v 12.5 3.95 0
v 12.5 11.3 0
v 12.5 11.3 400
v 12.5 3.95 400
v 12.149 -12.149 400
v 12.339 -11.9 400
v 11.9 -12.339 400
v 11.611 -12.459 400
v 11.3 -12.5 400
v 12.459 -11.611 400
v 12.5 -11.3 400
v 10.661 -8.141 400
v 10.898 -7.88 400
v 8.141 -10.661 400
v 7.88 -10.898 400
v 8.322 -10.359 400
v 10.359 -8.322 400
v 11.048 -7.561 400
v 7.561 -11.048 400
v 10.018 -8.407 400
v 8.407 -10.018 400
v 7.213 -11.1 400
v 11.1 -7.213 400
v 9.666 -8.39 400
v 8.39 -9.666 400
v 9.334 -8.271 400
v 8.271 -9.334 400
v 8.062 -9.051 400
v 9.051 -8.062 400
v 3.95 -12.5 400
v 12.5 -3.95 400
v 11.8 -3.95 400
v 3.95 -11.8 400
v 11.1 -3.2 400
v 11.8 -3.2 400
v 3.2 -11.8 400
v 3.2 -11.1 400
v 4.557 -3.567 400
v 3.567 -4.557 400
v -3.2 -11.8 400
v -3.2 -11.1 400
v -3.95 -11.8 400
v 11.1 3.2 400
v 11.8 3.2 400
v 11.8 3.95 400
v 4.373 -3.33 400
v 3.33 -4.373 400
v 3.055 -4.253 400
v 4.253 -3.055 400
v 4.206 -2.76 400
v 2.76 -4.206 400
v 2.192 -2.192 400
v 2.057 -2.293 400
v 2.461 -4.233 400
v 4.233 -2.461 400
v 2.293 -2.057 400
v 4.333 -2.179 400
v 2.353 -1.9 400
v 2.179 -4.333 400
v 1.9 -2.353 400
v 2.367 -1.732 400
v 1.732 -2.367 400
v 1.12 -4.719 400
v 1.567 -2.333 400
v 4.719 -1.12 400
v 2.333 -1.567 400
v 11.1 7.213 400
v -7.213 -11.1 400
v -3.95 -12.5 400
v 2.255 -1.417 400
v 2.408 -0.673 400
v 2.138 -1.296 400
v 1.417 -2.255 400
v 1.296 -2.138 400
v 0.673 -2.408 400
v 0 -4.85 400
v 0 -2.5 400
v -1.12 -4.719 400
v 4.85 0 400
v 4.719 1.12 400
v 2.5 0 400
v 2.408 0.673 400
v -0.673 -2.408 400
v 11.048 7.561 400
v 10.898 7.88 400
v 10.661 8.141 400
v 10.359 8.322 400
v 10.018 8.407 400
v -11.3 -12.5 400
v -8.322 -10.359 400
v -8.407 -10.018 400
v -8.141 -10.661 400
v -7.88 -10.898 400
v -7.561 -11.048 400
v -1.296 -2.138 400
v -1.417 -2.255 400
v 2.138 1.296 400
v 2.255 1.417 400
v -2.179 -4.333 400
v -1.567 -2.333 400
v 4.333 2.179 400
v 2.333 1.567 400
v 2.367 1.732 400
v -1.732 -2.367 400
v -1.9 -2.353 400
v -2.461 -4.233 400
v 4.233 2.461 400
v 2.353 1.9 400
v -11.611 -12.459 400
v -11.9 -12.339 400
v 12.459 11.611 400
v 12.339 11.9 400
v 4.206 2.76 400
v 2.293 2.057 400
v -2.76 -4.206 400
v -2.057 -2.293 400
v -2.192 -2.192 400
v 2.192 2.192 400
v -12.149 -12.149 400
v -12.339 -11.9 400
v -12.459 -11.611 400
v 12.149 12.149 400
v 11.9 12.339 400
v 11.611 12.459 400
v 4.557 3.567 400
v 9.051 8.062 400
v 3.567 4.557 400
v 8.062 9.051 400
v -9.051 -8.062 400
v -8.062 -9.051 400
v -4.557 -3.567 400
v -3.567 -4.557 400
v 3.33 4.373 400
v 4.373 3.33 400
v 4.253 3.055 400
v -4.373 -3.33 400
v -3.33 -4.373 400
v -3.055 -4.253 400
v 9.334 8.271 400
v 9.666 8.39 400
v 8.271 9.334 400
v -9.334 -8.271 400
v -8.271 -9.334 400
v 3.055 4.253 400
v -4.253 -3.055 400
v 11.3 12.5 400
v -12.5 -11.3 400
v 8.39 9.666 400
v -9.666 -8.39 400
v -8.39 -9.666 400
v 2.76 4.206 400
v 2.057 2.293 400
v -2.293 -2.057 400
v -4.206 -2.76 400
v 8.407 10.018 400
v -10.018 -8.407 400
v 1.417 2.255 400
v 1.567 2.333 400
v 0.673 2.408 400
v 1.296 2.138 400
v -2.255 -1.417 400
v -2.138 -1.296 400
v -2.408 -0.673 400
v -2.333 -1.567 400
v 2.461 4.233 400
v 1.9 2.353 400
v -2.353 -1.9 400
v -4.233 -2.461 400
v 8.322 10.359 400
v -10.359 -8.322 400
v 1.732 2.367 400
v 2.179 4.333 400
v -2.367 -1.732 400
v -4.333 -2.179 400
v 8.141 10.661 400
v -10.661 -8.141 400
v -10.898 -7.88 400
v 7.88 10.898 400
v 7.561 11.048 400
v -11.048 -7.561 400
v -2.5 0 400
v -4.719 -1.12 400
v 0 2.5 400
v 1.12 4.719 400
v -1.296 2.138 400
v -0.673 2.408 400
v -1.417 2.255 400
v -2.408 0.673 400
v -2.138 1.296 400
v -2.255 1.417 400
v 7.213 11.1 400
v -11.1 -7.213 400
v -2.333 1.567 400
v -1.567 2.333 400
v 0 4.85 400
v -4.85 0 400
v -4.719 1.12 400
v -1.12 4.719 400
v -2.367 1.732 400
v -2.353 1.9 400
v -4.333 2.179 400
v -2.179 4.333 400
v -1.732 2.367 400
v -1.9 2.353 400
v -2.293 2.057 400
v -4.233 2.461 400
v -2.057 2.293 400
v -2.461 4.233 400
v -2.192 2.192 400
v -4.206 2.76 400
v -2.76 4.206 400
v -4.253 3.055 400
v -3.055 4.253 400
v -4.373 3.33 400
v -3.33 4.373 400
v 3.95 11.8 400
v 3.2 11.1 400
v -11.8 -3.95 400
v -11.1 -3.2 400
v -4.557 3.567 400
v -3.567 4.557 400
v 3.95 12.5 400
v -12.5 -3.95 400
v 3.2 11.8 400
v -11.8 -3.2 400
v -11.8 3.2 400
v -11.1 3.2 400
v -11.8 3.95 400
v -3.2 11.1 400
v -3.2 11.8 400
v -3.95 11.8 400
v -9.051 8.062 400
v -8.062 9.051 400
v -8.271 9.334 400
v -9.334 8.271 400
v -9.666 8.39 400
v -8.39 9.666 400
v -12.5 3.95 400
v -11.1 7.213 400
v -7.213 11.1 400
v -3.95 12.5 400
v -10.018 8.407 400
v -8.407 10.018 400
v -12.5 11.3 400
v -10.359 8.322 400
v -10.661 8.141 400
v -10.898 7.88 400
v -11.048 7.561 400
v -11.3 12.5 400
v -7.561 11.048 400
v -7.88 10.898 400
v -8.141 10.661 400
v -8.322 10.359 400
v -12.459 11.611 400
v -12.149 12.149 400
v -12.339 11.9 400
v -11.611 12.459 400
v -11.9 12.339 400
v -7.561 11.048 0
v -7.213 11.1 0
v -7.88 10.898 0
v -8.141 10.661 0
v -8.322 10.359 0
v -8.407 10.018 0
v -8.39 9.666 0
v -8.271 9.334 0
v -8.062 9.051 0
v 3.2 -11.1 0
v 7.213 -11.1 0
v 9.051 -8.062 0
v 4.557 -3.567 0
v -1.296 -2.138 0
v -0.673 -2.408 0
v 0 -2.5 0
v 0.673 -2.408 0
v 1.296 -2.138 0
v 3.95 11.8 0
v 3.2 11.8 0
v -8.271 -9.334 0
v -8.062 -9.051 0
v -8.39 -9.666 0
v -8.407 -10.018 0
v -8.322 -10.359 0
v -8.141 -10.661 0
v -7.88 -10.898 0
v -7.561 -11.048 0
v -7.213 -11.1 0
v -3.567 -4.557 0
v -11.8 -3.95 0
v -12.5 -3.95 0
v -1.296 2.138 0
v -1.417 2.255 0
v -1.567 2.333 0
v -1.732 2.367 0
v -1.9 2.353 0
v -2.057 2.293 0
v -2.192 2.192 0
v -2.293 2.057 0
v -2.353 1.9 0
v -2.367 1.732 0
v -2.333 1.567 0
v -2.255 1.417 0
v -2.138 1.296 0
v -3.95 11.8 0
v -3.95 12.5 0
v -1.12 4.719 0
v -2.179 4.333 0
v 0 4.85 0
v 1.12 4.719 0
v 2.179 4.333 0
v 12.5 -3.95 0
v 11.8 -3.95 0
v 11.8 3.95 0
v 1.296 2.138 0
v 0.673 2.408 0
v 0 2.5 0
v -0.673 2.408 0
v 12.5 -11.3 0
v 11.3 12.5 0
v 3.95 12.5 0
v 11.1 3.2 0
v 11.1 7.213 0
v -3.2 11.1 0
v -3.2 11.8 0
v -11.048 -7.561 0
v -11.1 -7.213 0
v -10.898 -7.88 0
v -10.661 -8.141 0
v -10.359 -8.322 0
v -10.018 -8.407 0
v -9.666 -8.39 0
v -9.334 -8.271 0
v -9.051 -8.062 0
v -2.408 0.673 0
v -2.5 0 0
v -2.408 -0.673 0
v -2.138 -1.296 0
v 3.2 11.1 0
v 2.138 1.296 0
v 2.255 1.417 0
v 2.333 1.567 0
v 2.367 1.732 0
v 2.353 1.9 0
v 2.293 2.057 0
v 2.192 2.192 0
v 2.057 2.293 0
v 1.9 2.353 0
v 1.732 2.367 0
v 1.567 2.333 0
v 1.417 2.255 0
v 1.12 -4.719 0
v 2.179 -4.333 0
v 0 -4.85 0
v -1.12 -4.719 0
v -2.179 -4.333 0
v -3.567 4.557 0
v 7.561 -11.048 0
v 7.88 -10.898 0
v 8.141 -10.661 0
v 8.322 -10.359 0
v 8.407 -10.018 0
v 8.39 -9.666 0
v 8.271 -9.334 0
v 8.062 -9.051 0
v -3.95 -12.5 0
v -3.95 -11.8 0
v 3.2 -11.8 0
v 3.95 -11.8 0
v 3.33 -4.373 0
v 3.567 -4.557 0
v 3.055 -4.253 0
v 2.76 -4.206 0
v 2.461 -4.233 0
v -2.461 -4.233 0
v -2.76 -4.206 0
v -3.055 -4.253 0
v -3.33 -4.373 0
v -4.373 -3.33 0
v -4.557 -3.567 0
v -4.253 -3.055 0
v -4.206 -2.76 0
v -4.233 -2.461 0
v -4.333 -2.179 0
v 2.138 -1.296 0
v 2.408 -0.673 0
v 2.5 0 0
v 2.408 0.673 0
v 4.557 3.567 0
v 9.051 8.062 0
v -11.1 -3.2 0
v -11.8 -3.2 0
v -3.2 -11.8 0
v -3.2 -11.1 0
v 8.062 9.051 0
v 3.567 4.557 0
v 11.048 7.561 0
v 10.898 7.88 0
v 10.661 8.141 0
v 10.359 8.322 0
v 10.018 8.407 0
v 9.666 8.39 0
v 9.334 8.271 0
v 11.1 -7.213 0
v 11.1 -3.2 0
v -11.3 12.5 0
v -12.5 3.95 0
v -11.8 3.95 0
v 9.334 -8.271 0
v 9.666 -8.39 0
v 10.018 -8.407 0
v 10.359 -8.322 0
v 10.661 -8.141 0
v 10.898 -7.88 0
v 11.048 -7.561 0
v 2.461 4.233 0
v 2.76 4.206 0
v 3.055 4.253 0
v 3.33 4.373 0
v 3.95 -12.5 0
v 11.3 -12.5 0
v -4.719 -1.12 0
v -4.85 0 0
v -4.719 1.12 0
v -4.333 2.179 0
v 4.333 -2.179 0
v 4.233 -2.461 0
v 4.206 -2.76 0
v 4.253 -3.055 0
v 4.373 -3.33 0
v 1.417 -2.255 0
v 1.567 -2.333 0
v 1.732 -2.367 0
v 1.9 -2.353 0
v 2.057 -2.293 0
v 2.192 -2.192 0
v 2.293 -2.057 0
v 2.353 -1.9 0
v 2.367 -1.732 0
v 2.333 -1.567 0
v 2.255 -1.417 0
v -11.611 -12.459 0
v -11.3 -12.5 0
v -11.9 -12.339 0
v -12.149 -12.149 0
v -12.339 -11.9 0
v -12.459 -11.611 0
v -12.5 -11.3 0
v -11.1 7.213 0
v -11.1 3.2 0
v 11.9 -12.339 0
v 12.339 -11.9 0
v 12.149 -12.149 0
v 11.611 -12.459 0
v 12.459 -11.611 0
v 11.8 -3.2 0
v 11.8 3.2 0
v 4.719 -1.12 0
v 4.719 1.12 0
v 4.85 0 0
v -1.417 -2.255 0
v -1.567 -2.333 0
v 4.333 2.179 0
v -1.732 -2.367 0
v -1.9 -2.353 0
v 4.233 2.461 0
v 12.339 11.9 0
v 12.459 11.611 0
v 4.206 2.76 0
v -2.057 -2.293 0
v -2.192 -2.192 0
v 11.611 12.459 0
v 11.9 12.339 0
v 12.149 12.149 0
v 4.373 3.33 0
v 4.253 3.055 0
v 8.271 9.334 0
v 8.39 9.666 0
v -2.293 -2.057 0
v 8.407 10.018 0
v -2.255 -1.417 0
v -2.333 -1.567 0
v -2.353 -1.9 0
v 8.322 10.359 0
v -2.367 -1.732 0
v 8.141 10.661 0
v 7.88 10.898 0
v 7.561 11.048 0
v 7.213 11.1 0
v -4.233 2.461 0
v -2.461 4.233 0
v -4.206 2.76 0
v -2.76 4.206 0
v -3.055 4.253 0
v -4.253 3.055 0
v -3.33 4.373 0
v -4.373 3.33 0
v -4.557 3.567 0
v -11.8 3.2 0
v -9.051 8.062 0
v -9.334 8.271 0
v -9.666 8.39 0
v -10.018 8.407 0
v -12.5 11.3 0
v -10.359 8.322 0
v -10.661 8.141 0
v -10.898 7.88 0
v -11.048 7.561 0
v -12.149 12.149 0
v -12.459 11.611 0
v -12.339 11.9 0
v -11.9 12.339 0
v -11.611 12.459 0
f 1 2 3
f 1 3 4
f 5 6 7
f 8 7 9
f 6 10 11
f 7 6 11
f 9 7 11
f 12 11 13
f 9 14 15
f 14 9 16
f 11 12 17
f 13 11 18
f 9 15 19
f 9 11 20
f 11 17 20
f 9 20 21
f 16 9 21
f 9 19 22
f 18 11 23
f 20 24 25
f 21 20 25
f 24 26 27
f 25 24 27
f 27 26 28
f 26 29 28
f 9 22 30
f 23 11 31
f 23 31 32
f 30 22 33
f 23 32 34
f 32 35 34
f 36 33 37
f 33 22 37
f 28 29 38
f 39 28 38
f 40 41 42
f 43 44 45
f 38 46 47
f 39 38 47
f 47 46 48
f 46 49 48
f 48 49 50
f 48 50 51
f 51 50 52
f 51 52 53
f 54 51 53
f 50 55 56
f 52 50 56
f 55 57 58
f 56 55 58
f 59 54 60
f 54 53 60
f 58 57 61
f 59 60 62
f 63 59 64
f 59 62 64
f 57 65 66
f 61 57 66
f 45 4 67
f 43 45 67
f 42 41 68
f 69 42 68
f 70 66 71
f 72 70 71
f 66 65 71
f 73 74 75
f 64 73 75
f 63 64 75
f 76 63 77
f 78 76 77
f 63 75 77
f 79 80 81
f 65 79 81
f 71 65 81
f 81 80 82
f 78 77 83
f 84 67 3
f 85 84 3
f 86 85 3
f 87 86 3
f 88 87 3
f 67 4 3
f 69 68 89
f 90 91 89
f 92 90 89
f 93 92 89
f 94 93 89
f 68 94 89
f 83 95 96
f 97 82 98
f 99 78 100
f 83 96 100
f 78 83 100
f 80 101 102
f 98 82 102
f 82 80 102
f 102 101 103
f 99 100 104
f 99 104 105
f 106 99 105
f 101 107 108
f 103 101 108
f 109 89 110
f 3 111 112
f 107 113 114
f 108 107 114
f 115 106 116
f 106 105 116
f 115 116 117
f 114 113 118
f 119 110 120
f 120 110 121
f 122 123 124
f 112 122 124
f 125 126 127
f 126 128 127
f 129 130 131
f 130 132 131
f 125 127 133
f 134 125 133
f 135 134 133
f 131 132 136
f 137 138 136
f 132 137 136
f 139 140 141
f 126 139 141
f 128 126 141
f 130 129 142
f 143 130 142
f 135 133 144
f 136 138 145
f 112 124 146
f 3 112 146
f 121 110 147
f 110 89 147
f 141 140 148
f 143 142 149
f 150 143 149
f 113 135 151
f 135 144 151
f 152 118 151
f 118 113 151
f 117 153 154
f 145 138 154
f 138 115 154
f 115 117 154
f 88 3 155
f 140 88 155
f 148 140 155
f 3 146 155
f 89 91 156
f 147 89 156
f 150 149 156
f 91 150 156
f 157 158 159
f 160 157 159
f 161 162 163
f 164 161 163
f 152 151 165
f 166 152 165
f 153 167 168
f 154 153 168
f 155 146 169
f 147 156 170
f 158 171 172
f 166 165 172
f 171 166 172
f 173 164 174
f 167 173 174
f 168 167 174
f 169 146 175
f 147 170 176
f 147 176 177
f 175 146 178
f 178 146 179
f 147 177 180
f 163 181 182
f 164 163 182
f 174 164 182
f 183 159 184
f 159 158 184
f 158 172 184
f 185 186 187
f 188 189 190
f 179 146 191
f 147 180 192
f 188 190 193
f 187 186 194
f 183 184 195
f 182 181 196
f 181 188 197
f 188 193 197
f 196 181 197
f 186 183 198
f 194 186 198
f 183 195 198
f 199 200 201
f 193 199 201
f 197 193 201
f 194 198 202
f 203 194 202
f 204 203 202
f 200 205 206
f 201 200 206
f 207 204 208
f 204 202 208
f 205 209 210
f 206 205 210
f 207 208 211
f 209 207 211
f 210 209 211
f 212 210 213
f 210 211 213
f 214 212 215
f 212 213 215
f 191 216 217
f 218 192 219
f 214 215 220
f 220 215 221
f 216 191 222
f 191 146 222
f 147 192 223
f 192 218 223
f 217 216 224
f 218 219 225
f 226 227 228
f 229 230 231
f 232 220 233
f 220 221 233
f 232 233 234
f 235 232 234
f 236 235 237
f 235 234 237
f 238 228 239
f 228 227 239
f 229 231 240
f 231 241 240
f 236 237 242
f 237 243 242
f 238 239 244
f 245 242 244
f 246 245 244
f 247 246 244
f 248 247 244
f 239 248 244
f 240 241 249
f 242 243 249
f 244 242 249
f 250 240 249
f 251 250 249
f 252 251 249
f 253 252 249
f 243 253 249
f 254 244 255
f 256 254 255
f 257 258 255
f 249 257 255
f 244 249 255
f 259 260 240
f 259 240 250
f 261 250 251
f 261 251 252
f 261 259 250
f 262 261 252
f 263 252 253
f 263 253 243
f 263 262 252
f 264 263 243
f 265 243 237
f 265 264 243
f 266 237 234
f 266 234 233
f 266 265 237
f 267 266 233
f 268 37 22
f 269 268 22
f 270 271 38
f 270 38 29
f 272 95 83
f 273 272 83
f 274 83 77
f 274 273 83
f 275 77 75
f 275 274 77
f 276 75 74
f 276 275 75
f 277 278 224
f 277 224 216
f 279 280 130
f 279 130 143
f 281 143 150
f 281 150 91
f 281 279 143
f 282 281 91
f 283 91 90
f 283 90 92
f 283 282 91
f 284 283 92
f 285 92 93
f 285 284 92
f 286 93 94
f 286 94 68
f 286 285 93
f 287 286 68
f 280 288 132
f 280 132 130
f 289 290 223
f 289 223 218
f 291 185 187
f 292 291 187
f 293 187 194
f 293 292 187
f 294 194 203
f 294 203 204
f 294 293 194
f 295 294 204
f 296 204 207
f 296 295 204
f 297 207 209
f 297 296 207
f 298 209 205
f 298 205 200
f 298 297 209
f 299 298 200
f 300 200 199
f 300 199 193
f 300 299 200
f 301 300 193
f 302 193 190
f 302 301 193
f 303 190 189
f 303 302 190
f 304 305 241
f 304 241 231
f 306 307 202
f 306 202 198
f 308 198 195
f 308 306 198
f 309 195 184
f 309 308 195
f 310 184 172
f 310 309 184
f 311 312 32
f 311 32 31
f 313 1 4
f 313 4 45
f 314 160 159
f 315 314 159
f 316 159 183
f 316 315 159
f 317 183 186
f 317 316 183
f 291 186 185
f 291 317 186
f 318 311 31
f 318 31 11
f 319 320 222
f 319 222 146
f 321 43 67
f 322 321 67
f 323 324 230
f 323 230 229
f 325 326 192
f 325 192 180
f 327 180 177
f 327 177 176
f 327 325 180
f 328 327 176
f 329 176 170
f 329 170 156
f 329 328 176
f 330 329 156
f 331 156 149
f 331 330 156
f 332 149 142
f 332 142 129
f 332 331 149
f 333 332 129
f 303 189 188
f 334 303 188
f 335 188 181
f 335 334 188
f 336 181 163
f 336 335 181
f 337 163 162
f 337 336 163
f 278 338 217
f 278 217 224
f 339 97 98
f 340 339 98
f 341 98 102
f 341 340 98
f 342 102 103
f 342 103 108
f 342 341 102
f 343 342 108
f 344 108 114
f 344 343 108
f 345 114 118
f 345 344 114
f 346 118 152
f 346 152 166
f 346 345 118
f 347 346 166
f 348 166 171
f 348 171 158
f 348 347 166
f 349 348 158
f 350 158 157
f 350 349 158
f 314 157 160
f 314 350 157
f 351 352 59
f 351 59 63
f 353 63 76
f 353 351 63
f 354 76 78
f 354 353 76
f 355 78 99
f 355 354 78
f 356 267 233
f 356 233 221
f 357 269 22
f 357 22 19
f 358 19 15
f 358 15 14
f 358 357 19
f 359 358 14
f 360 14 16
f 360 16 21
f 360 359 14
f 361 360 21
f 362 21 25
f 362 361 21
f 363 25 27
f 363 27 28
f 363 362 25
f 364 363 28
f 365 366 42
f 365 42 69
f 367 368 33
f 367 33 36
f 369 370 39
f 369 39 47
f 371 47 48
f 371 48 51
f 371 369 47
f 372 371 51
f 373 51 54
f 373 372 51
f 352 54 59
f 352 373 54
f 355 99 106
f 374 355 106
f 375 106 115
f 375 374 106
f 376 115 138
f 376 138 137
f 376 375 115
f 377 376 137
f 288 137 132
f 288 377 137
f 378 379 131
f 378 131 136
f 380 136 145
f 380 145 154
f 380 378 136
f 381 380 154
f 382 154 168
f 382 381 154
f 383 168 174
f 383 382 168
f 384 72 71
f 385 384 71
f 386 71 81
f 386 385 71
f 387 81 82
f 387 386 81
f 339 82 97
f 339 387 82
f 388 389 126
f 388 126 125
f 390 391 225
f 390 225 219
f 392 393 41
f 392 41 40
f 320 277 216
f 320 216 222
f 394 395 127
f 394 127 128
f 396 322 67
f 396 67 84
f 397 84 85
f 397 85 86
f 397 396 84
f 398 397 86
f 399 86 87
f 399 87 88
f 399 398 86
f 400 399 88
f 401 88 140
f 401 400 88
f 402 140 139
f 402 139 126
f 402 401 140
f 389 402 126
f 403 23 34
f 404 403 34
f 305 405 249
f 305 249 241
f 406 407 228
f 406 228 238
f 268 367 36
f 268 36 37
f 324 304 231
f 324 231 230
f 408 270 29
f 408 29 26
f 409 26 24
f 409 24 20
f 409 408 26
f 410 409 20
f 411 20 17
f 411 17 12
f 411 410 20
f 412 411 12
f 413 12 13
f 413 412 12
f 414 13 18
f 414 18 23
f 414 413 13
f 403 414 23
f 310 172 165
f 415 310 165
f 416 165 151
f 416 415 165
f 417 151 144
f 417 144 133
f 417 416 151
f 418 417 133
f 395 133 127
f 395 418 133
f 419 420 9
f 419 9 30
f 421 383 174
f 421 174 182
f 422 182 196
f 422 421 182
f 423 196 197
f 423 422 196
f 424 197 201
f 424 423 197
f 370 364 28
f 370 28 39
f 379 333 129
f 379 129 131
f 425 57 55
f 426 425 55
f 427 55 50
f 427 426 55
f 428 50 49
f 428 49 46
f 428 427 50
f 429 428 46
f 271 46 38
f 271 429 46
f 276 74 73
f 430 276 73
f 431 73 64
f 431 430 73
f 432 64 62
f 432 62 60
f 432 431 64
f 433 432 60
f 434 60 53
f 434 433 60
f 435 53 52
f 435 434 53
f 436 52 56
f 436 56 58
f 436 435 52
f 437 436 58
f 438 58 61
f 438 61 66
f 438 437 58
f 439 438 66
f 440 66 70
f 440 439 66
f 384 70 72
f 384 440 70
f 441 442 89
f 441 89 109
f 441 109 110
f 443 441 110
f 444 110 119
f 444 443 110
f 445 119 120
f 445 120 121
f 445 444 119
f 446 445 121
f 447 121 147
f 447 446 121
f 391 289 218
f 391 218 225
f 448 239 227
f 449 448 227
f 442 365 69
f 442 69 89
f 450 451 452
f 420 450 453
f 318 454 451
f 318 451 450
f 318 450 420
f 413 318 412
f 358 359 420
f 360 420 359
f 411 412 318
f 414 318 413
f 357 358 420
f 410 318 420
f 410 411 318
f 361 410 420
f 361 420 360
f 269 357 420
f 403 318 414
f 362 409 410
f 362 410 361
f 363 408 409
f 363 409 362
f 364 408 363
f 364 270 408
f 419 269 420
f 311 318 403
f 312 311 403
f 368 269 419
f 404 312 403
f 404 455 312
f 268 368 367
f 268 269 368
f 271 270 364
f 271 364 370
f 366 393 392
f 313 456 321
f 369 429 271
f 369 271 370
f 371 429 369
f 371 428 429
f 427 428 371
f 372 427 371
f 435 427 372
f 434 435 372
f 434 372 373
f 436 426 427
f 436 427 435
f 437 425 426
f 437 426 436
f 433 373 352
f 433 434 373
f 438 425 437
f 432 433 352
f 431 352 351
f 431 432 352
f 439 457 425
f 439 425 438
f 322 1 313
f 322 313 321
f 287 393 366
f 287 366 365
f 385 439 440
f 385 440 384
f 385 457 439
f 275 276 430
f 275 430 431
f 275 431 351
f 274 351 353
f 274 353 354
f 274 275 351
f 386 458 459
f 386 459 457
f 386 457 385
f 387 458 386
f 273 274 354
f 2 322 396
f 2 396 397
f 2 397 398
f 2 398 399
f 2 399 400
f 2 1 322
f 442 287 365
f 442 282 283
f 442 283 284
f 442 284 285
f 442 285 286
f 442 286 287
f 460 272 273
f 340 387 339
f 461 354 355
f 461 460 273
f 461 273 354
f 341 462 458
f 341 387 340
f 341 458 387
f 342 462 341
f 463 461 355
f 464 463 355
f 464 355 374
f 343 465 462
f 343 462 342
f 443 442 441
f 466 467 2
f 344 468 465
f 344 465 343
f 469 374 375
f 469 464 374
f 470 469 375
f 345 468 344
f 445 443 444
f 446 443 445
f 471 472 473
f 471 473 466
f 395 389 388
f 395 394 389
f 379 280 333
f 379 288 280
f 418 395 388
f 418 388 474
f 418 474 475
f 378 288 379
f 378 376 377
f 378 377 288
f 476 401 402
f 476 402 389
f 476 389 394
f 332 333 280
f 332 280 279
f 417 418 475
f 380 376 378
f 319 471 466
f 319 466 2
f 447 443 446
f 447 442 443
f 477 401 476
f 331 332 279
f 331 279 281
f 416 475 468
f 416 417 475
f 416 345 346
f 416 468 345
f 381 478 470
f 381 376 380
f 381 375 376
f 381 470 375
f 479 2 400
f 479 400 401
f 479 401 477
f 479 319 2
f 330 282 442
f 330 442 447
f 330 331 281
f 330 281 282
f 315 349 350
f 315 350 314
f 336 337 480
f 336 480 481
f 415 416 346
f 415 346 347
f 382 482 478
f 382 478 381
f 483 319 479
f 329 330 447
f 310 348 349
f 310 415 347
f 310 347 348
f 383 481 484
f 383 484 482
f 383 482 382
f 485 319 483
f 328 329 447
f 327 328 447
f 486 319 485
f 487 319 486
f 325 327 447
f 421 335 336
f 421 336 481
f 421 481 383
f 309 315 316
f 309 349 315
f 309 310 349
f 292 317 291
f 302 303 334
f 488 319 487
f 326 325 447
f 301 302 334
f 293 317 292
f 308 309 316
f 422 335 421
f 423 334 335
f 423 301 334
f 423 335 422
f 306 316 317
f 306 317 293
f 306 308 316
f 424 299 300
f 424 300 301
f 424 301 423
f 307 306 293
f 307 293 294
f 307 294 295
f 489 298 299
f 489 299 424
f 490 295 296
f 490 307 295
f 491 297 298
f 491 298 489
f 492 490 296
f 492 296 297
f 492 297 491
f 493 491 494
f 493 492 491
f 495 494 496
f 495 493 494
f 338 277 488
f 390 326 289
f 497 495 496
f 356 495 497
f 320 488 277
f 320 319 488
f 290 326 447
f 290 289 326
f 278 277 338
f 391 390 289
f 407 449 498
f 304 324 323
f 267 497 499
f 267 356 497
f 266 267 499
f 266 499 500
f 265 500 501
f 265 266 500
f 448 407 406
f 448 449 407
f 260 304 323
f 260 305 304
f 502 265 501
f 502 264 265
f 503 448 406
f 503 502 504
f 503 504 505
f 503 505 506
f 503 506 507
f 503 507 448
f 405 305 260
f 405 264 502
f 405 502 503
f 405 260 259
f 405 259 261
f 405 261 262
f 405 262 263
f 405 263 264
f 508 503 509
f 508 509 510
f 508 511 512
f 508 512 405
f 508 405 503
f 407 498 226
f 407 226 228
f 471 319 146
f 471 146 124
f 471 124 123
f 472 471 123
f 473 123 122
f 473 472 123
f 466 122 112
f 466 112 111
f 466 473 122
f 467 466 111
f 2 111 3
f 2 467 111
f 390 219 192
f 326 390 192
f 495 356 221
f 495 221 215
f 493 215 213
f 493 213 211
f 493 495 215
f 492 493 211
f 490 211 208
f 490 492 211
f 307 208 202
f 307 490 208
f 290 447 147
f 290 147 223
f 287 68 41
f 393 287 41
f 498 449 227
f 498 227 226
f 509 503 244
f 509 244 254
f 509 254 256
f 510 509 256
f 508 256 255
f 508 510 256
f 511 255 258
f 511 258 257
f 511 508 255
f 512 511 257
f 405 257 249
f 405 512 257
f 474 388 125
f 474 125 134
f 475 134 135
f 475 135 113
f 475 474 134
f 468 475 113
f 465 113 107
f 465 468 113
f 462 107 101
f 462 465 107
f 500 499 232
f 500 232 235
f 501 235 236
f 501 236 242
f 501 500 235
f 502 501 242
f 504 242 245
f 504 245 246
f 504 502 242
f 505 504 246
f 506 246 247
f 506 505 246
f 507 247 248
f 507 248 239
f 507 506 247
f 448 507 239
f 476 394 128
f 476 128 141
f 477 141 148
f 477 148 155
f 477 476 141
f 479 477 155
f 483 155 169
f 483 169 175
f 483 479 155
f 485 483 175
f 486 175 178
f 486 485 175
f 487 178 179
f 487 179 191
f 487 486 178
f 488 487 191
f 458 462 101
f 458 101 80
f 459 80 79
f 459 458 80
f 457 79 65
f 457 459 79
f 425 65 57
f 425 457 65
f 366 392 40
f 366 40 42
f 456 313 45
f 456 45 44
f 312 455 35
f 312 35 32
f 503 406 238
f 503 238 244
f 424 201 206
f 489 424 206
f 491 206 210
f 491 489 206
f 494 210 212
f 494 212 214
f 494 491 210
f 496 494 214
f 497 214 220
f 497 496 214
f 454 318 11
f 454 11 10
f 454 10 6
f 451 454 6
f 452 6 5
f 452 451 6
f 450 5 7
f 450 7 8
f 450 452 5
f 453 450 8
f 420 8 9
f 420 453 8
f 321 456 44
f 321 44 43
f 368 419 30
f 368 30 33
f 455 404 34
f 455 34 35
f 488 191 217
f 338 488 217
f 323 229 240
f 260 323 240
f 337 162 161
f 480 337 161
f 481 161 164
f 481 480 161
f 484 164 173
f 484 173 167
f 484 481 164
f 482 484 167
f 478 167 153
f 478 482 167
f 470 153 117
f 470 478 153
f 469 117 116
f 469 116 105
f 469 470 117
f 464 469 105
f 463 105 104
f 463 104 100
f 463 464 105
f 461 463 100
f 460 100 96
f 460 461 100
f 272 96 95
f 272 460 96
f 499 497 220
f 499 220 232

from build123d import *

# Parameters (mm, degrees)
Y_KSEKLIK_EKSTR_ZYON1_DEPTH = 400


with BuildPart() as part:
    # Çizim1 → Yükseklik-Ekstrüzyon1 (new body)
    with BuildSketch(Plane.XY):
        with BuildLine():
            Line((3.95, 12.5), (11.3, 12.5))
            ThreePointArc((11.3, 12.5), (12.148528137, 12.148528137), (12.5, 11.3))
            Line((12.5, 11.3), (12.5, 3.95))
            Line((12.5, 3.95), (11.8, 3.95))
            Line((11.8, 3.95), (11.8, 3.2))
            Line((11.8, 3.2), (11.1, 3.2))
            Line((11.1, 3.2), (11.1, 7.212994231))
            ThreePointArc((11.1, 7.212994231), (10.359220119, 8.321649671), (9.051471863, 8.061522369))
            Line((9.051471863, 8.061522369), (4.55653233, 3.566582836))
            ThreePointArc((4.55653233, 3.566582836), (4.220335715, 2.90891397), (4.332982358, 2.178936411))
            ThreePointArc((4.332982358, 2.178936411), (4.85, 0), (4.332982358, -2.178936411))
            ThreePointArc((4.332982358, -2.178936411), (4.220335715, -2.90891397), (4.55653233, -3.566582836))
            Line((4.55653233, -3.566582836), (9.051471863, -8.061522369))
            ThreePointArc((9.051471863, -8.061522369), (10.359220119, -8.321649671), (11.1, -7.212994231))
            Line((11.1, -7.212994231), (11.1, -3.2))
            Line((11.1, -3.2), (11.8, -3.2))
            Line((11.8, -3.2), (11.8, -3.95))
            Line((11.8, -3.95), (12.5, -3.95))
            Line((12.5, -3.95), (12.5, -11.3))
            ThreePointArc((12.5, -11.3), (12.148528137, -12.148528137), (11.3, -12.5))
            Line((11.3, -12.5), (3.95, -12.5))
            Line((3.95, -12.5), (3.95, -11.8))
            Line((3.95, -11.8), (3.2, -11.8))
            Line((3.2, -11.8), (3.2, -11.1))
            Line((3.2, -11.1), (7.212994231, -11.1))
            ThreePointArc((7.212994231, -11.1), (8.321649671, -10.359220119), (8.061522369, -9.051471863))
            Line((8.061522369, -9.051471863), (3.566582836, -4.55653233))
            ThreePointArc((3.566582836, -4.55653233), (2.90891397, -4.220335715), (2.178936411, -4.332982358))
            ThreePointArc((2.178936411, -4.332982358), (0, -4.85), (-2.178936411, -4.332982358))
            ThreePointArc((-2.178936411, -4.332982358), (-2.90891397, -4.220335715), (-3.566582836, -4.55653233))
            Line((-3.566582836, -4.55653233), (-8.061522369, -9.051471863))
            ThreePointArc((-8.061522369, -9.051471863), (-8.321649671, -10.359220119), (-7.212994231, -11.1))
            Line((-7.212994231, -11.1), (-3.2, -11.1))
            Line((-3.2, -11.1), (-3.2, -11.8))
            Line((-3.2, -11.8), (-3.95, -11.8))
            Line((-3.95, -11.8), (-3.95, -12.5))
            Line((-3.95, -12.5), (-11.3, -12.5))
            ThreePointArc((-11.3, -12.5), (-12.148528137, -12.148528137), (-12.5, -11.3))
            Line((-12.5, -11.3), (-12.5, -3.95))
            Line((-12.5, -3.95), (-11.8, -3.95))
            Line((-11.8, -3.95), (-11.8, -3.2))
            Line((-11.8, -3.2), (-11.1, -3.2))
            Line((-11.1, -3.2), (-11.1, -7.212994231))
            ThreePointArc((-11.1, -7.212994231), (-10.359220119, -8.321649671), (-9.051471863, -8.061522369))
            Line((-9.051471863, -8.061522369), (-4.55653233, -3.566582836))
            ThreePointArc((-4.55653233, -3.566582836), (-4.220335715, -2.90891397), (-4.332982358, -2.178936411))
            ThreePointArc((-4.332982358, -2.178936411), (-4.85, 0), (-4.332982358, 2.178936411))
            ThreePointArc((-4.332982358, 2.178936411), (-4.220335715, 2.90891397), (-4.55653233, 3.566582836))
            Line((-4.55653233, 3.566582836), (-9.051471863, 8.061522369))
            ThreePointArc((-9.051471863, 8.061522369), (-10.359220119, 8.321649671), (-11.1, 7.212994231))
            Line((-11.1, 7.212994231), (-11.1, 3.2))
            Line((-11.1, 3.2), (-11.8, 3.2))
            Line((-11.8, 3.2), (-11.8, 3.95))
            Line((-11.8, 3.95), (-12.5, 3.95))
            Line((-12.5, 3.95), (-12.5, 11.3))
            ThreePointArc((-12.5, 11.3), (-12.148528137, 12.148528137), (-11.3, 12.5))
            Line((-11.3, 12.5), (-3.95, 12.5))
            Line((-3.95, 12.5), (-3.95, 11.8))
            Line((-3.95, 11.8), (-3.2, 11.8))
            Line((-3.2, 11.8), (-3.2, 11.1))
            Line((-3.2, 11.1), (-7.212994231, 11.1))
            ThreePointArc((-7.212994231, 11.1), (-8.321649671, 10.359220119), (-8.061522369, 9.051471863))
            Line((-8.061522369, 9.051471863), (-3.566582836, 4.55653233))
            ThreePointArc((-3.566582836, 4.55653233), (-2.90891397, 4.220335715), (-2.178936411, 4.332982358))
            ThreePointArc((-2.178936411, 4.332982358), (0, 4.85), (2.178936411, 4.332982358))
            ThreePointArc((2.178936411, 4.332982358), (2.90891397, 4.220335715), (3.566582836, 4.55653233))
            Line((3.566582836, 4.55653233), (8.061522369, 9.051471863))
            ThreePointArc((8.061522369, 9.051471863), (8.321649671, 10.359220119), (7.212994231, 11.1))
            Line((7.212994231, 11.1), (3.2, 11.1))
            Line((3.2, 11.1), (3.2, 11.8))
            Line((3.2, 11.8), (3.95, 11.8))
            Line((3.95, 11.8), (3.95, 12.5))
        make_face()
        with BuildLine():
            ThreePointArc((1.295656974, 2.138053555), (0, 2.5), (-1.295656974, 2.138053555))
            ThreePointArc((-1.295656974, 2.138053555), (-2.192031022, 2.192031022), (-2.138053555, 1.295656974))
            ThreePointArc((-2.138053555, 1.295656974), (-2.5, 0), (-2.138053555, -1.295656974))
            ThreePointArc((-2.138053555, -1.295656974), (-2.192031022, -2.192031022), (-1.295656974, -2.138053555))
            ThreePointArc((-1.295656974, -2.138053555), (0, -2.5), (1.295656974, -2.138053555))
            ThreePointArc((1.295656974, -2.138053555), (2.192031022, -2.192031022), (2.138053555, -1.295656974))
            ThreePointArc((2.138053555, -1.295656974), (2.5, 0), (2.138053555, 1.295656974))
            ThreePointArc((2.138053555, 1.295656974), (2.192031022, 2.192031022), (1.295656974, 2.138053555))
        make_face(mode=Mode.SUBTRACT)
    extrude(amount=Y_KSEKLIK_EKSTR_ZYON1_DEPTH)


solid = part.part
